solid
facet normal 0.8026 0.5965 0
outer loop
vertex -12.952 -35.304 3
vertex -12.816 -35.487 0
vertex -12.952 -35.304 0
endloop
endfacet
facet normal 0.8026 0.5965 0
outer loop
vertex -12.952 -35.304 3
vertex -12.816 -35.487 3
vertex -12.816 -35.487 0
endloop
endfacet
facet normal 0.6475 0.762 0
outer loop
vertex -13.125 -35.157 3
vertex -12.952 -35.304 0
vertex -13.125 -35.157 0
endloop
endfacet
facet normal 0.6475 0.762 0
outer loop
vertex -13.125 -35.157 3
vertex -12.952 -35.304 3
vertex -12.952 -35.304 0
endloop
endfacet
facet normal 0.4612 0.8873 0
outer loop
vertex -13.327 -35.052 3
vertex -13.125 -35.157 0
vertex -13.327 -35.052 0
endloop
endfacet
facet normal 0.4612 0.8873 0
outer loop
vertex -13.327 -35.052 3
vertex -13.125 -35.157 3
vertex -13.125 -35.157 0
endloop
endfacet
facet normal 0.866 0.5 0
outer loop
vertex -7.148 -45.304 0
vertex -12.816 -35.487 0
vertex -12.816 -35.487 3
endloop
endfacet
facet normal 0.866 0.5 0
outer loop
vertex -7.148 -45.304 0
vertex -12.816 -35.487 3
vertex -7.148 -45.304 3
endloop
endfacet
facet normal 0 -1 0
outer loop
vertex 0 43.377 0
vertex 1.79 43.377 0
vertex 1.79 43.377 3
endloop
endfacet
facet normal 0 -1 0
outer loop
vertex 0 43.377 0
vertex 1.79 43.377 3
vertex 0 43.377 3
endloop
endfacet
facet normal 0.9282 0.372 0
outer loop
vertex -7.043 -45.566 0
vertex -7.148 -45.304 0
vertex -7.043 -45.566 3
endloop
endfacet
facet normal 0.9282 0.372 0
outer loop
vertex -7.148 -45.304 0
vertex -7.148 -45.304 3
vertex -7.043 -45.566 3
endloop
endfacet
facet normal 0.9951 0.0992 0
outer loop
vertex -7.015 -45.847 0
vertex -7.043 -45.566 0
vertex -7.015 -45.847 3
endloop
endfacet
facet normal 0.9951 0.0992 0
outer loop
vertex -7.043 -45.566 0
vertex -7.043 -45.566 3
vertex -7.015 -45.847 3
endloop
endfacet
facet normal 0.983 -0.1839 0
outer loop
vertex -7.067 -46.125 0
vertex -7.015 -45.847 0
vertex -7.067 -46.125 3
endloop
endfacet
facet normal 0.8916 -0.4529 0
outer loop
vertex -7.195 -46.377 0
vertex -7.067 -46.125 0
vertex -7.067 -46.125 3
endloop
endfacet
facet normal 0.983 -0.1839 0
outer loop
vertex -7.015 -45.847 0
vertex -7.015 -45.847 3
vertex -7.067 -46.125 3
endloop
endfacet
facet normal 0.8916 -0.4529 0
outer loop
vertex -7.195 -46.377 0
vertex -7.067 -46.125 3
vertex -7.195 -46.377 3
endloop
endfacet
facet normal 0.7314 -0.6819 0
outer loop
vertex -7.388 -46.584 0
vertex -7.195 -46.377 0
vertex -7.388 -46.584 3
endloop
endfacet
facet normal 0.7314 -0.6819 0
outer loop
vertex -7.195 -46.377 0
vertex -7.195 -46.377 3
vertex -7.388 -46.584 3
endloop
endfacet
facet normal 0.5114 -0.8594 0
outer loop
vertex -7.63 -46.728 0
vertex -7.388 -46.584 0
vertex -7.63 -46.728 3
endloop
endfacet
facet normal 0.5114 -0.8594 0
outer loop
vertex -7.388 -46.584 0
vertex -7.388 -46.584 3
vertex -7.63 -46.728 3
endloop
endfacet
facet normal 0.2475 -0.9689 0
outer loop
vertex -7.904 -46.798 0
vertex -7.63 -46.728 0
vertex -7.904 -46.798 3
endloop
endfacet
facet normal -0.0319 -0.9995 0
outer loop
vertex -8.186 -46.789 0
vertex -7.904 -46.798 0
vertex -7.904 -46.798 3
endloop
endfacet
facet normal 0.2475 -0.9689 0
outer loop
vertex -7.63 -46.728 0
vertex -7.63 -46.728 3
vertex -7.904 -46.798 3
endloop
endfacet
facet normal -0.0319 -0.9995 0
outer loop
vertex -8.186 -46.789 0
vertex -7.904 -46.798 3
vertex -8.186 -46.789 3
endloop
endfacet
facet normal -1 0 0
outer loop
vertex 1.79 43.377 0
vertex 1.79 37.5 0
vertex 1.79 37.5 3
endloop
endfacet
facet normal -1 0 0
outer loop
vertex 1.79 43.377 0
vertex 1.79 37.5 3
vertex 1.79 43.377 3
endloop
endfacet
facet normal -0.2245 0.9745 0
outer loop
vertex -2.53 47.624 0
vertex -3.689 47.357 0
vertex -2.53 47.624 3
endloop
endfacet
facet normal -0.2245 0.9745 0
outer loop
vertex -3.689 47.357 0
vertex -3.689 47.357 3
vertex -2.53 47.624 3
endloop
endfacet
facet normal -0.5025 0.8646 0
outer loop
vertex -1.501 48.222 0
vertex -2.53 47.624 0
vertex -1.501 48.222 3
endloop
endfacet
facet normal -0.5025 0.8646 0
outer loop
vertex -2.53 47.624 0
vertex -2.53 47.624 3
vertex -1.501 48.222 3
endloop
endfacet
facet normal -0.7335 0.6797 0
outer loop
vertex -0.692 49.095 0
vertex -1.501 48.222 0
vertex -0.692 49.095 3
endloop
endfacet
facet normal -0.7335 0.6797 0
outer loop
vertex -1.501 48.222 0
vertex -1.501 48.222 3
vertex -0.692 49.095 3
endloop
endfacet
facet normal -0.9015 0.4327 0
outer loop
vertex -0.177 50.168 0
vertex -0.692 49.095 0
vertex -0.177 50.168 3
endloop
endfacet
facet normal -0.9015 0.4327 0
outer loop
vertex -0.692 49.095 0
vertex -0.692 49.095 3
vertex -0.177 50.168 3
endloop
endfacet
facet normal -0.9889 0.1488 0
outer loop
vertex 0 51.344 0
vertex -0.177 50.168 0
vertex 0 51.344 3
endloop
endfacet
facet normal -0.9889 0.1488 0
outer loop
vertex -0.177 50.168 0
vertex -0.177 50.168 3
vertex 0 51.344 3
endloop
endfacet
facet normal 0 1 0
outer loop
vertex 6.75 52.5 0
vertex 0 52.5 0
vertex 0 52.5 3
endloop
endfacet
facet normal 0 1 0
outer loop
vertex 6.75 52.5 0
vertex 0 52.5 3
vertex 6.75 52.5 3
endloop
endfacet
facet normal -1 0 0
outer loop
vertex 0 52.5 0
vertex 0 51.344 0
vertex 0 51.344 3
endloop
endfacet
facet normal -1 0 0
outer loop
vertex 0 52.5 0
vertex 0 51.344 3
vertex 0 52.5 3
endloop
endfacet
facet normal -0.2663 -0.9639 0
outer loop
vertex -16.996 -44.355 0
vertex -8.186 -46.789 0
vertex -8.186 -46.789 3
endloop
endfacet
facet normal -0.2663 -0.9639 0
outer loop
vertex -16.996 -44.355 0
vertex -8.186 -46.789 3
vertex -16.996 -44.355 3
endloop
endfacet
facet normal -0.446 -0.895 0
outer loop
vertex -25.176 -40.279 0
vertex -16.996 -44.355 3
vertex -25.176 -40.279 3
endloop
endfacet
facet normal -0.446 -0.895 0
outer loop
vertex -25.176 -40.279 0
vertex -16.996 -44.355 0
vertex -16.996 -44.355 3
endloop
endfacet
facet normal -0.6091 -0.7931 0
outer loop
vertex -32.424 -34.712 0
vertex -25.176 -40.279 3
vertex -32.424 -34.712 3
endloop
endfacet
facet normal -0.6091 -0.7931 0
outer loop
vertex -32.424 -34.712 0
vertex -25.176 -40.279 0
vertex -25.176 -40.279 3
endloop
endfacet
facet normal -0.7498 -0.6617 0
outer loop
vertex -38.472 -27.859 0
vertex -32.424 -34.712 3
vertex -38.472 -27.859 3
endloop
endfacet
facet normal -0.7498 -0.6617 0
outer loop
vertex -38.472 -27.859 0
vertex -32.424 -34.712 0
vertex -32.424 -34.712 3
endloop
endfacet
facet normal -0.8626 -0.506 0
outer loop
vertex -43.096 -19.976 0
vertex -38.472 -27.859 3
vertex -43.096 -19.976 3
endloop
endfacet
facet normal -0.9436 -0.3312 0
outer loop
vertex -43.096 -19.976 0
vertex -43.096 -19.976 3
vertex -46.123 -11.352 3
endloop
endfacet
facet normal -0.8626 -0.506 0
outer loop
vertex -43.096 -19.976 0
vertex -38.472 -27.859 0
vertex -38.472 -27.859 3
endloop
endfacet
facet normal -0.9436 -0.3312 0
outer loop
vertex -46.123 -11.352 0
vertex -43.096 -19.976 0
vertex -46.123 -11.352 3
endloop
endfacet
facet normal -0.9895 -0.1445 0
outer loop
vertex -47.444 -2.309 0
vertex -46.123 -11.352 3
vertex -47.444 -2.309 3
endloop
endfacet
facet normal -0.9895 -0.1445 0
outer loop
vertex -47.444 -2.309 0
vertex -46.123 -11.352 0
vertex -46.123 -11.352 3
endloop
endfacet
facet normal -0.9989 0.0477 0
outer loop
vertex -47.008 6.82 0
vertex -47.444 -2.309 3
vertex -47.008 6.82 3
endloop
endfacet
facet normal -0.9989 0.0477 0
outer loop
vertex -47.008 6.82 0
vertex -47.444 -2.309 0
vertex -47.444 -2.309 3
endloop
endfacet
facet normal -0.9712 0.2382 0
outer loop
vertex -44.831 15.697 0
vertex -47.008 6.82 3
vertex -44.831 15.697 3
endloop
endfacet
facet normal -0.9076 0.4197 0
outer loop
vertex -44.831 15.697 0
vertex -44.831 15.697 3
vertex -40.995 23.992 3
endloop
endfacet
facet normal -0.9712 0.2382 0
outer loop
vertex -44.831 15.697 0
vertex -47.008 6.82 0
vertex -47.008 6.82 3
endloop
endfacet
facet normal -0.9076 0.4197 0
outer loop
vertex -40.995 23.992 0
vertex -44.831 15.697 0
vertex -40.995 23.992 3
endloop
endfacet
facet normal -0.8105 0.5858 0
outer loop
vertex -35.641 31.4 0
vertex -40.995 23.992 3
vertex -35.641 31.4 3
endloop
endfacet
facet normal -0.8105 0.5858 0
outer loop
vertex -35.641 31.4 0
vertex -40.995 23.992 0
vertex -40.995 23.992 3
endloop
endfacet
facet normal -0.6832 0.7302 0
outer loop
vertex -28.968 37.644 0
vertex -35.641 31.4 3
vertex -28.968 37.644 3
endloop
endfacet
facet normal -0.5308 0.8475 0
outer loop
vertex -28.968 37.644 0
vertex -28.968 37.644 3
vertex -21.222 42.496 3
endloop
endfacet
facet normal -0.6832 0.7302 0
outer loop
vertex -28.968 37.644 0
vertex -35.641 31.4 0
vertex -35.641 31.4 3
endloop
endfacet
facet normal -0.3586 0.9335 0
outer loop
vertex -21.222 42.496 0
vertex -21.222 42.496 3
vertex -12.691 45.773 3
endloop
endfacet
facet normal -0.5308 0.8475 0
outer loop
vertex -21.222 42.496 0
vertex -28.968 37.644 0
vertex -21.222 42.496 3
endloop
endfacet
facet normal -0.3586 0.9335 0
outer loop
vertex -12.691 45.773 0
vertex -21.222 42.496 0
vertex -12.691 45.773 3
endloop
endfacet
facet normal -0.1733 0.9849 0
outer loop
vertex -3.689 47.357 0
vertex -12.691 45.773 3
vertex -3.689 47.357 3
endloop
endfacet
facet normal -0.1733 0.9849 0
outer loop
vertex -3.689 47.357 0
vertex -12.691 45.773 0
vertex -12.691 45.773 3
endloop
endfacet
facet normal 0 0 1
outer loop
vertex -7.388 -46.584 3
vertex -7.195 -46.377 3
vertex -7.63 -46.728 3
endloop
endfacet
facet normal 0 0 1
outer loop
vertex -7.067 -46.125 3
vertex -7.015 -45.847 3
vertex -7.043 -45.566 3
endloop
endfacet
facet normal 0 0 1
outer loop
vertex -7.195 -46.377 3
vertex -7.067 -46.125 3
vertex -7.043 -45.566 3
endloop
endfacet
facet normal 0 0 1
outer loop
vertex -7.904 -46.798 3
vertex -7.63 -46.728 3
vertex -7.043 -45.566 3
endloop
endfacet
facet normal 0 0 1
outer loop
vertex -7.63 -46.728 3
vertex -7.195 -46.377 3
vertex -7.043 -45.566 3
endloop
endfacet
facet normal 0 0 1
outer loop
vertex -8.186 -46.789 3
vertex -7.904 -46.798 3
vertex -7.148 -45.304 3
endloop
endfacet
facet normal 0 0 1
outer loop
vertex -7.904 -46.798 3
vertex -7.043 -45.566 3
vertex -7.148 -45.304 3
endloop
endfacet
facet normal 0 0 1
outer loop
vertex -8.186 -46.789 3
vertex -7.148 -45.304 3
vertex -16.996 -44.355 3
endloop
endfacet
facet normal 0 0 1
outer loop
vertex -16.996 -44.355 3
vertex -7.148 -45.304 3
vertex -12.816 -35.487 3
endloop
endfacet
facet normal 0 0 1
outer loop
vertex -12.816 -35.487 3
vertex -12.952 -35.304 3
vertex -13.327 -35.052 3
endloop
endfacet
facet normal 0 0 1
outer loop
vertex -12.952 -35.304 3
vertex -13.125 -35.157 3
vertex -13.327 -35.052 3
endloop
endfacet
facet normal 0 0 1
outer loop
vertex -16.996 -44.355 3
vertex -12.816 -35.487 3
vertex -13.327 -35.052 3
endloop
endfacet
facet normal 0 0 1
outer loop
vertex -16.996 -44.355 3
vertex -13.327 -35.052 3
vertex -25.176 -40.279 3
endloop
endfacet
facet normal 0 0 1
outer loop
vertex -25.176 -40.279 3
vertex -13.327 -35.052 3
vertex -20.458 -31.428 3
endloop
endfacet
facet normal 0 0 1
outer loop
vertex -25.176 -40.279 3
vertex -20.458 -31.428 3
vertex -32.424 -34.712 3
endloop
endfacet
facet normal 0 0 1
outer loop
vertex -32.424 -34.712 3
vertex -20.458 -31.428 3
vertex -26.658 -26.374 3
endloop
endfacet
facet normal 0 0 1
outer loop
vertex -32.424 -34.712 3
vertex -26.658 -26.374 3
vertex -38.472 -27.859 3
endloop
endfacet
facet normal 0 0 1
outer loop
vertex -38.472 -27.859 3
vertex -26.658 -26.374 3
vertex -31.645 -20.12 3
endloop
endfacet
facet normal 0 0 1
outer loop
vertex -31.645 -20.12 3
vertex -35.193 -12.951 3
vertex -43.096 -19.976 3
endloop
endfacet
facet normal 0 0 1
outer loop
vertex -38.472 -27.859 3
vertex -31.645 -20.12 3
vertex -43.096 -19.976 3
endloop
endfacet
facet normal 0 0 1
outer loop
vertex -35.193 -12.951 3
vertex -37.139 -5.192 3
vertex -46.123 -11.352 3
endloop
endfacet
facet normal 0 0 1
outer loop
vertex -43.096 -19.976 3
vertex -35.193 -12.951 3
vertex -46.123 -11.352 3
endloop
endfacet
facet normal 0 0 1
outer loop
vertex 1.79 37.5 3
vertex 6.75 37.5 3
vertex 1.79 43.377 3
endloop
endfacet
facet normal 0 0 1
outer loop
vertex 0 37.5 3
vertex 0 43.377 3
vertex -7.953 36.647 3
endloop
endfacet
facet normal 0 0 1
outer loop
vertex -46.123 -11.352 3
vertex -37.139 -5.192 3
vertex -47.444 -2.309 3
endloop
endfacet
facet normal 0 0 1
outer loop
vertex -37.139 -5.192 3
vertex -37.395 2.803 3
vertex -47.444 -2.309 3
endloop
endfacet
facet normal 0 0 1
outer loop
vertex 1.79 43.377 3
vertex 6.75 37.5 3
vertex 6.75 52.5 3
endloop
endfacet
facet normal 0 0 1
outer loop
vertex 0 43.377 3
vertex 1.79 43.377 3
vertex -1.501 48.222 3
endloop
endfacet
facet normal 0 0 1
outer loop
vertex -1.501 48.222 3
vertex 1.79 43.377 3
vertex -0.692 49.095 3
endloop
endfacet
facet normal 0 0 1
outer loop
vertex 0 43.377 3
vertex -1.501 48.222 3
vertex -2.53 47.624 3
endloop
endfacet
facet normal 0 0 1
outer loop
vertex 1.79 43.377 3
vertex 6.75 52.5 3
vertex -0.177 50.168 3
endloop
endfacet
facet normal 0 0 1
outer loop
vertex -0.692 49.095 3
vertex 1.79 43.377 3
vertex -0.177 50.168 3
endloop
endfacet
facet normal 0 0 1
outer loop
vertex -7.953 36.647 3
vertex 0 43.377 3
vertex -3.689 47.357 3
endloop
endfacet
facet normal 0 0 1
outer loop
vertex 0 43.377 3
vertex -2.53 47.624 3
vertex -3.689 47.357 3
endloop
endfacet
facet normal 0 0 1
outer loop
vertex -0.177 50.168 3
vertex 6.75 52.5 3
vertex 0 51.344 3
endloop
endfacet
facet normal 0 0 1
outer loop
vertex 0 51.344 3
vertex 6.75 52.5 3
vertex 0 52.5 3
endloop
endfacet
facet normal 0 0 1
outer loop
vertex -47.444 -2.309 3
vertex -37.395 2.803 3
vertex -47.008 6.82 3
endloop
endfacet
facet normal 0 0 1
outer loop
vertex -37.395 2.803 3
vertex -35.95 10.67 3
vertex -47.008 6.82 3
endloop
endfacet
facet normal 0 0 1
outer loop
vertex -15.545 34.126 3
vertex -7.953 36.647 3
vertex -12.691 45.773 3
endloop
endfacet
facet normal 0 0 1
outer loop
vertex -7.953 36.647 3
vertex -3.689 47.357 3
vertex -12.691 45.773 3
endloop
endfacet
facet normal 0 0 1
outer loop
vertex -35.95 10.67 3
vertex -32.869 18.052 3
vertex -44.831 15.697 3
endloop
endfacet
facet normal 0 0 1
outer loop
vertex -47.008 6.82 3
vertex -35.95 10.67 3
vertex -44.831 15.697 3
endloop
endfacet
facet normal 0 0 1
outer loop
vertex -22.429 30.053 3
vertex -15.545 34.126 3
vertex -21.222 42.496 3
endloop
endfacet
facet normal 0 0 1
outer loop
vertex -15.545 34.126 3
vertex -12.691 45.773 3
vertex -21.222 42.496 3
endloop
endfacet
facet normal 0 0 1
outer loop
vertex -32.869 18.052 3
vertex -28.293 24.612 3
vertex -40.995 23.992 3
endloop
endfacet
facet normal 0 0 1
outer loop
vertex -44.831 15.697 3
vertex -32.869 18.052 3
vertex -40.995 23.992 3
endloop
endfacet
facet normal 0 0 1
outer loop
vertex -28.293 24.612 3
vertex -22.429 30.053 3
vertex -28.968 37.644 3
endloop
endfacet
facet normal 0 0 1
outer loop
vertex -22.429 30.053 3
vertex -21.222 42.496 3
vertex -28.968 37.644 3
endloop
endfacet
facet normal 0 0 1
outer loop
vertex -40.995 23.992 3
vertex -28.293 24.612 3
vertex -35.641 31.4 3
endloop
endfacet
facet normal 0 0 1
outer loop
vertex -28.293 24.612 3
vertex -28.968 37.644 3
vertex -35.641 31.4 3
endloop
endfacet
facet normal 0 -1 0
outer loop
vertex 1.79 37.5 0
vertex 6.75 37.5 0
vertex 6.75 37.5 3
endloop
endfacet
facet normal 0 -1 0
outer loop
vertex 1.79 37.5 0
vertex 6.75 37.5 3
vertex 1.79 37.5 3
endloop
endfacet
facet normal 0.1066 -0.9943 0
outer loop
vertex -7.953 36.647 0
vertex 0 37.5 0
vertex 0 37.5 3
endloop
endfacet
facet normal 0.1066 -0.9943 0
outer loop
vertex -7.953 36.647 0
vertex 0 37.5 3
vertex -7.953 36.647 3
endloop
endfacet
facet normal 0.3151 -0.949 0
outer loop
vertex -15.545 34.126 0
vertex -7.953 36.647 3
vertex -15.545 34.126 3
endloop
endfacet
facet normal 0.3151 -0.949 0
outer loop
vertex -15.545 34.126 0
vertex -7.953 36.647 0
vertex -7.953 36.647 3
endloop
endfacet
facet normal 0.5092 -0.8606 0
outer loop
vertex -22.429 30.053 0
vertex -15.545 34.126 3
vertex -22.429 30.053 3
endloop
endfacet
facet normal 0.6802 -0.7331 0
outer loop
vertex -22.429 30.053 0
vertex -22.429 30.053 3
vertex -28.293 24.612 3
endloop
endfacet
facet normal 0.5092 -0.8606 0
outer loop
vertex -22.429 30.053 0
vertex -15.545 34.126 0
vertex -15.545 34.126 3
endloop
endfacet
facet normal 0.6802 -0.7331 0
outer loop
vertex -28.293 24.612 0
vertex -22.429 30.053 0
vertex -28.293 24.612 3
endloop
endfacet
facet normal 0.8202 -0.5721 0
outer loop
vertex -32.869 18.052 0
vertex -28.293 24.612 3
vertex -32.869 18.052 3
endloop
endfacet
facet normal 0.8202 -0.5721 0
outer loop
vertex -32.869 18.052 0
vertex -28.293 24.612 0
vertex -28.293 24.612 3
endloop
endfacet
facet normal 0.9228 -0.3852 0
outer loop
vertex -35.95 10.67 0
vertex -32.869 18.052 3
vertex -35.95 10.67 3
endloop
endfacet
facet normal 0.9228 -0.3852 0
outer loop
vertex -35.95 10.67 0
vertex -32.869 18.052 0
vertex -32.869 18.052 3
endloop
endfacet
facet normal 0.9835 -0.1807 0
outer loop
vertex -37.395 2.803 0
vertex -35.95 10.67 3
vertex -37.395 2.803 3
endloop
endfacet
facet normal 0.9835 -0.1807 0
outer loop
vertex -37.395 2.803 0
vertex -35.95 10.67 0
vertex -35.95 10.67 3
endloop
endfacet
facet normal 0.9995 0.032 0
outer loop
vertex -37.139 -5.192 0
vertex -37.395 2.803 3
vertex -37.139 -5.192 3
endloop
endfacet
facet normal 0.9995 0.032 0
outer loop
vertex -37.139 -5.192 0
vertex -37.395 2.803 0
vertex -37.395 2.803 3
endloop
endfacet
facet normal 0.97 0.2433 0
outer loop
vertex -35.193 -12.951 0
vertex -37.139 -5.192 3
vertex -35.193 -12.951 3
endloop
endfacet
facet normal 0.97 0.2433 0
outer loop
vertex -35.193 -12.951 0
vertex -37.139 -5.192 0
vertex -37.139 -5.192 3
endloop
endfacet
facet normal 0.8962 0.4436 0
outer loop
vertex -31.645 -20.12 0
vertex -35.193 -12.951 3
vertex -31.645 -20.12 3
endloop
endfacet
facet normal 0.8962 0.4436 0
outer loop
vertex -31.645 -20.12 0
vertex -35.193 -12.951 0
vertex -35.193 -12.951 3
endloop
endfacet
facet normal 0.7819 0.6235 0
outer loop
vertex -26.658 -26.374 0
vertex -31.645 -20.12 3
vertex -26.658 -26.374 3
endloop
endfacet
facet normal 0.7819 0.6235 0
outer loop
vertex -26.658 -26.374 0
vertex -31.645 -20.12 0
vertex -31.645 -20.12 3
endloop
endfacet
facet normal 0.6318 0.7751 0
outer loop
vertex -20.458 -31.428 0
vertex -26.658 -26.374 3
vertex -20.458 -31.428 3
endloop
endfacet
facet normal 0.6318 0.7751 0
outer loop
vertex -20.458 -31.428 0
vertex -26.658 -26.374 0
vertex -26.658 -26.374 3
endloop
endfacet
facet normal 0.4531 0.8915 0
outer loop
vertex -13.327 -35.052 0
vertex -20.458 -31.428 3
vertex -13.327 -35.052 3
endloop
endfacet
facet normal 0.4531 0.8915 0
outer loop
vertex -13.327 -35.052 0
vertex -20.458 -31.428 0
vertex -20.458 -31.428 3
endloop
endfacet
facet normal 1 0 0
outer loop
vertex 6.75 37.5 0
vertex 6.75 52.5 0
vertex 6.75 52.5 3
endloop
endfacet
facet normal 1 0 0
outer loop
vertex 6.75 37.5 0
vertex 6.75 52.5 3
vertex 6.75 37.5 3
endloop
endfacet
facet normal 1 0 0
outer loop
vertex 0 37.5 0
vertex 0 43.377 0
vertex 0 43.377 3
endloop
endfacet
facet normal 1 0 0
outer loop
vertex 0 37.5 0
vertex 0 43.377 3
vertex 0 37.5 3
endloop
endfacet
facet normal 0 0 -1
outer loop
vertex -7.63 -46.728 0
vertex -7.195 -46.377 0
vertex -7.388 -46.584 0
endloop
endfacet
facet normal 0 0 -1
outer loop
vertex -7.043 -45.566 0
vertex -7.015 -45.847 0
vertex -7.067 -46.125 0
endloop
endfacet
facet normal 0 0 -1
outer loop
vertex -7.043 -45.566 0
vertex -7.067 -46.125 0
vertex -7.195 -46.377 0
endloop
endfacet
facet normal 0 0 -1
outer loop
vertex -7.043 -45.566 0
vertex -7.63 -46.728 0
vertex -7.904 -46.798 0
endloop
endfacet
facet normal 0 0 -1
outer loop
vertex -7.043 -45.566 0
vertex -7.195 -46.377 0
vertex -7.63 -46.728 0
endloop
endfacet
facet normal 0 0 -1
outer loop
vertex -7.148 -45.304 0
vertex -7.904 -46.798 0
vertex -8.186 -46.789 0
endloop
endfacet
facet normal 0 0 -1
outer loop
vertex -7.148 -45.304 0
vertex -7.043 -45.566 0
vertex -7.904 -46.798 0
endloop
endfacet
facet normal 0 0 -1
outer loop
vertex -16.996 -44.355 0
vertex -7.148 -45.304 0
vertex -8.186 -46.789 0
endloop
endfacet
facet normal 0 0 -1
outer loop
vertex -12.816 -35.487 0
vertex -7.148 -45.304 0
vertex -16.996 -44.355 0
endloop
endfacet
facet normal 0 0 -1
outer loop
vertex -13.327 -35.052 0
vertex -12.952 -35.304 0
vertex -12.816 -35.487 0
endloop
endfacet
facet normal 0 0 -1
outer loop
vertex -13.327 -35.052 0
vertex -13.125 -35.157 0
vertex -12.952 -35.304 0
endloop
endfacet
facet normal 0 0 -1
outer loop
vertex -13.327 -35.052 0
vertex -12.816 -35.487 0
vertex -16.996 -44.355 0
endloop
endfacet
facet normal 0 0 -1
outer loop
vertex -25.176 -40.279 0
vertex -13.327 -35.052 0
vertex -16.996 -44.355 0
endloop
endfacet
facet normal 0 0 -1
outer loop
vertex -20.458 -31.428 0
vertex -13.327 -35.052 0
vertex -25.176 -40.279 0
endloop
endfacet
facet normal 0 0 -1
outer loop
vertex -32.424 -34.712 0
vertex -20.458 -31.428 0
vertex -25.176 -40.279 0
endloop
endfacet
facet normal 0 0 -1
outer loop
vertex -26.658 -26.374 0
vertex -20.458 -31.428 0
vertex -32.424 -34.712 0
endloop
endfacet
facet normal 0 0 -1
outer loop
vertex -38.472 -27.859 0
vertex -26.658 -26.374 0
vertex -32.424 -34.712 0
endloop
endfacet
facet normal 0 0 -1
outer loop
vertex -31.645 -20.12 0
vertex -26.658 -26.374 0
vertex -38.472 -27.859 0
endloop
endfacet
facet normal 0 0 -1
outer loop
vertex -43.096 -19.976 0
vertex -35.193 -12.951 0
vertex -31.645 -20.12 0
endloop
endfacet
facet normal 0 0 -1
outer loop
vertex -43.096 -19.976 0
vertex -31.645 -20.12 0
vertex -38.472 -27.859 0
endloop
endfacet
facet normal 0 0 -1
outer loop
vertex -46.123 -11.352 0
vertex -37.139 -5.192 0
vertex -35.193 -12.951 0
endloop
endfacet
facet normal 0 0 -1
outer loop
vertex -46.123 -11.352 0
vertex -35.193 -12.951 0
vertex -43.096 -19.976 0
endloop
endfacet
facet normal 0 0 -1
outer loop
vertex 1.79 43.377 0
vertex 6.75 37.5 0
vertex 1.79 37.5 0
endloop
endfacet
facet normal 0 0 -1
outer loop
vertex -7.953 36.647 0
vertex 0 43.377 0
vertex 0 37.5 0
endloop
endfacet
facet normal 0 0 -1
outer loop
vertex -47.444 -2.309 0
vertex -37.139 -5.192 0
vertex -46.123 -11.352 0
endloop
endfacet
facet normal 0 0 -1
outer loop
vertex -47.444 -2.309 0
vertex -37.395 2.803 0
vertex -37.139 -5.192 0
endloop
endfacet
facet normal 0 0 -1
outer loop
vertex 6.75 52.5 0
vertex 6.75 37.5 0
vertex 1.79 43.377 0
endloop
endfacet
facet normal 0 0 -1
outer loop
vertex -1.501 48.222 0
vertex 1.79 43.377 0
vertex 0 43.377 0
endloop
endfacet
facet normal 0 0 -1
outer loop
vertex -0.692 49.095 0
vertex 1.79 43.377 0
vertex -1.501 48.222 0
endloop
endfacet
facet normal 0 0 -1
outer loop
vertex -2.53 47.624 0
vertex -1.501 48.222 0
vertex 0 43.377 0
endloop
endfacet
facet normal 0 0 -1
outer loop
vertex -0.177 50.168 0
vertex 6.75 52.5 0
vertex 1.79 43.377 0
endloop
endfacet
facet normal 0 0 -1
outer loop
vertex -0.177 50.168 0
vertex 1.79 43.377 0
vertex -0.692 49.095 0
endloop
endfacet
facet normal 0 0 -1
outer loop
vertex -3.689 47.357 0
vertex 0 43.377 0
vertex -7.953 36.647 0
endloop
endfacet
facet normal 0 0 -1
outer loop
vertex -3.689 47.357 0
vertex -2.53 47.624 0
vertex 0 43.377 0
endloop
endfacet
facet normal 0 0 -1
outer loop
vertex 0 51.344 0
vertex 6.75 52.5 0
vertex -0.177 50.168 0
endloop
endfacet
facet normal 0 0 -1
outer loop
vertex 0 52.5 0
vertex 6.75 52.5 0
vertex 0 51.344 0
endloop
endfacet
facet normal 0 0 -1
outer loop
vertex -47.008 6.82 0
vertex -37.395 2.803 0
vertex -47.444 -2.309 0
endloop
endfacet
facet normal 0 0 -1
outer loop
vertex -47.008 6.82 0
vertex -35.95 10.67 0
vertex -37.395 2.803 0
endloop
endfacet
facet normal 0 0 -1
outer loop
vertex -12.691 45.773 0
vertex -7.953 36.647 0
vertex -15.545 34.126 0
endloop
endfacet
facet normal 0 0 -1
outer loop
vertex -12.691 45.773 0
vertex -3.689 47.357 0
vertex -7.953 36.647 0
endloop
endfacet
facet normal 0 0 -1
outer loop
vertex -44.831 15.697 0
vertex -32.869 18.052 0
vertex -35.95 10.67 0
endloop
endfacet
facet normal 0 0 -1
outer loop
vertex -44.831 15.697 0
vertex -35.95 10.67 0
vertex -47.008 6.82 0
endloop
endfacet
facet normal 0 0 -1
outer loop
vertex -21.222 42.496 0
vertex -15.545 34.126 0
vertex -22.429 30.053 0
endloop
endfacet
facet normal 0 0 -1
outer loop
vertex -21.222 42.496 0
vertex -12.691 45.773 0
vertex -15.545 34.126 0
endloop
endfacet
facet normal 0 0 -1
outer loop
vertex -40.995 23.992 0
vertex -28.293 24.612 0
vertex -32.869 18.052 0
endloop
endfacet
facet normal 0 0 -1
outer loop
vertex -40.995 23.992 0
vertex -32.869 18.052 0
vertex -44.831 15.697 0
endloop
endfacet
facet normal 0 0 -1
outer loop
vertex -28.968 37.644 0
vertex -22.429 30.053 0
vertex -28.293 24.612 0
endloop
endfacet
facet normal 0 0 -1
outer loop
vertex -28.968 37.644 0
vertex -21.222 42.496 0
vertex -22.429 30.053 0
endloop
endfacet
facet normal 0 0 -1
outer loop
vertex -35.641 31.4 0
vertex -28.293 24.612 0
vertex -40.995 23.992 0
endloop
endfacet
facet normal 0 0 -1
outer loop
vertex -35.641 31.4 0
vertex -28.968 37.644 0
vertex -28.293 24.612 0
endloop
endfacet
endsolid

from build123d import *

# Parameters (mm, degrees)
BOSS_EXTRUDE1_DEPTH = 3
FILLET1_R           = 4
FILLET2_R           = 1
FILLET3_R           = 1


with BuildPart() as part:
    # Sketch1 → Boss-Extrude1 (new body)
    with BuildSketch(Plane.XY):
        with BuildLine():
            Line((0, 43.376726626), (0, 37.5))
            ThreePointArc((0, 37.5), (-36.914491769, 6.600780063), (-12.99543687, -35.176250803))
            Line((-12.99543687, -35.176250803), (-6.107994139, -47.105651546))
            ThreePointArc((-6.107994139, -47.105651546), (-47.401310364, 3.060355499), (0, 47.5))
            Line((0, 47.5), (0, 52.5))
            Line((0, 52.5), (6.75, 52.5))
            Line((6.75, 52.5), (6.75, 37.5))
            Line((6.75, 37.5), (1.79, 37.5))
            Line((1.79, 37.5), (1.79, 43.376726626))
            Line((1.79, 43.376726626), (0, 43.376726626))
        make_face()
    extrude(amount=BOSS_EXTRUDE1_DEPTH)

    # Fillet1
    fillet1_edges = [part.edges().sort_by_distance(p)[0] for p in [
        (0, 47.5, 1.5),
    ]]
    fillet(fillet1_edges, radius=FILLET1_R)

    # Fillet2
    fillet2_edges = [part.edges().sort_by_distance(p)[0] for p in [
        (-12.99543687, -35.176250803, 1.5),
    ]]
    fillet(fillet2_edges, radius=FILLET2_R)

    # Fillet3
    fillet3_edges = [part.edges().sort_by_distance(p)[0] for p in [
        (-6.107994139, -47.105651546, 1.5),
    ]]
    fillet(fillet3_edges, radius=FILLET3_R)


solid = part.part
